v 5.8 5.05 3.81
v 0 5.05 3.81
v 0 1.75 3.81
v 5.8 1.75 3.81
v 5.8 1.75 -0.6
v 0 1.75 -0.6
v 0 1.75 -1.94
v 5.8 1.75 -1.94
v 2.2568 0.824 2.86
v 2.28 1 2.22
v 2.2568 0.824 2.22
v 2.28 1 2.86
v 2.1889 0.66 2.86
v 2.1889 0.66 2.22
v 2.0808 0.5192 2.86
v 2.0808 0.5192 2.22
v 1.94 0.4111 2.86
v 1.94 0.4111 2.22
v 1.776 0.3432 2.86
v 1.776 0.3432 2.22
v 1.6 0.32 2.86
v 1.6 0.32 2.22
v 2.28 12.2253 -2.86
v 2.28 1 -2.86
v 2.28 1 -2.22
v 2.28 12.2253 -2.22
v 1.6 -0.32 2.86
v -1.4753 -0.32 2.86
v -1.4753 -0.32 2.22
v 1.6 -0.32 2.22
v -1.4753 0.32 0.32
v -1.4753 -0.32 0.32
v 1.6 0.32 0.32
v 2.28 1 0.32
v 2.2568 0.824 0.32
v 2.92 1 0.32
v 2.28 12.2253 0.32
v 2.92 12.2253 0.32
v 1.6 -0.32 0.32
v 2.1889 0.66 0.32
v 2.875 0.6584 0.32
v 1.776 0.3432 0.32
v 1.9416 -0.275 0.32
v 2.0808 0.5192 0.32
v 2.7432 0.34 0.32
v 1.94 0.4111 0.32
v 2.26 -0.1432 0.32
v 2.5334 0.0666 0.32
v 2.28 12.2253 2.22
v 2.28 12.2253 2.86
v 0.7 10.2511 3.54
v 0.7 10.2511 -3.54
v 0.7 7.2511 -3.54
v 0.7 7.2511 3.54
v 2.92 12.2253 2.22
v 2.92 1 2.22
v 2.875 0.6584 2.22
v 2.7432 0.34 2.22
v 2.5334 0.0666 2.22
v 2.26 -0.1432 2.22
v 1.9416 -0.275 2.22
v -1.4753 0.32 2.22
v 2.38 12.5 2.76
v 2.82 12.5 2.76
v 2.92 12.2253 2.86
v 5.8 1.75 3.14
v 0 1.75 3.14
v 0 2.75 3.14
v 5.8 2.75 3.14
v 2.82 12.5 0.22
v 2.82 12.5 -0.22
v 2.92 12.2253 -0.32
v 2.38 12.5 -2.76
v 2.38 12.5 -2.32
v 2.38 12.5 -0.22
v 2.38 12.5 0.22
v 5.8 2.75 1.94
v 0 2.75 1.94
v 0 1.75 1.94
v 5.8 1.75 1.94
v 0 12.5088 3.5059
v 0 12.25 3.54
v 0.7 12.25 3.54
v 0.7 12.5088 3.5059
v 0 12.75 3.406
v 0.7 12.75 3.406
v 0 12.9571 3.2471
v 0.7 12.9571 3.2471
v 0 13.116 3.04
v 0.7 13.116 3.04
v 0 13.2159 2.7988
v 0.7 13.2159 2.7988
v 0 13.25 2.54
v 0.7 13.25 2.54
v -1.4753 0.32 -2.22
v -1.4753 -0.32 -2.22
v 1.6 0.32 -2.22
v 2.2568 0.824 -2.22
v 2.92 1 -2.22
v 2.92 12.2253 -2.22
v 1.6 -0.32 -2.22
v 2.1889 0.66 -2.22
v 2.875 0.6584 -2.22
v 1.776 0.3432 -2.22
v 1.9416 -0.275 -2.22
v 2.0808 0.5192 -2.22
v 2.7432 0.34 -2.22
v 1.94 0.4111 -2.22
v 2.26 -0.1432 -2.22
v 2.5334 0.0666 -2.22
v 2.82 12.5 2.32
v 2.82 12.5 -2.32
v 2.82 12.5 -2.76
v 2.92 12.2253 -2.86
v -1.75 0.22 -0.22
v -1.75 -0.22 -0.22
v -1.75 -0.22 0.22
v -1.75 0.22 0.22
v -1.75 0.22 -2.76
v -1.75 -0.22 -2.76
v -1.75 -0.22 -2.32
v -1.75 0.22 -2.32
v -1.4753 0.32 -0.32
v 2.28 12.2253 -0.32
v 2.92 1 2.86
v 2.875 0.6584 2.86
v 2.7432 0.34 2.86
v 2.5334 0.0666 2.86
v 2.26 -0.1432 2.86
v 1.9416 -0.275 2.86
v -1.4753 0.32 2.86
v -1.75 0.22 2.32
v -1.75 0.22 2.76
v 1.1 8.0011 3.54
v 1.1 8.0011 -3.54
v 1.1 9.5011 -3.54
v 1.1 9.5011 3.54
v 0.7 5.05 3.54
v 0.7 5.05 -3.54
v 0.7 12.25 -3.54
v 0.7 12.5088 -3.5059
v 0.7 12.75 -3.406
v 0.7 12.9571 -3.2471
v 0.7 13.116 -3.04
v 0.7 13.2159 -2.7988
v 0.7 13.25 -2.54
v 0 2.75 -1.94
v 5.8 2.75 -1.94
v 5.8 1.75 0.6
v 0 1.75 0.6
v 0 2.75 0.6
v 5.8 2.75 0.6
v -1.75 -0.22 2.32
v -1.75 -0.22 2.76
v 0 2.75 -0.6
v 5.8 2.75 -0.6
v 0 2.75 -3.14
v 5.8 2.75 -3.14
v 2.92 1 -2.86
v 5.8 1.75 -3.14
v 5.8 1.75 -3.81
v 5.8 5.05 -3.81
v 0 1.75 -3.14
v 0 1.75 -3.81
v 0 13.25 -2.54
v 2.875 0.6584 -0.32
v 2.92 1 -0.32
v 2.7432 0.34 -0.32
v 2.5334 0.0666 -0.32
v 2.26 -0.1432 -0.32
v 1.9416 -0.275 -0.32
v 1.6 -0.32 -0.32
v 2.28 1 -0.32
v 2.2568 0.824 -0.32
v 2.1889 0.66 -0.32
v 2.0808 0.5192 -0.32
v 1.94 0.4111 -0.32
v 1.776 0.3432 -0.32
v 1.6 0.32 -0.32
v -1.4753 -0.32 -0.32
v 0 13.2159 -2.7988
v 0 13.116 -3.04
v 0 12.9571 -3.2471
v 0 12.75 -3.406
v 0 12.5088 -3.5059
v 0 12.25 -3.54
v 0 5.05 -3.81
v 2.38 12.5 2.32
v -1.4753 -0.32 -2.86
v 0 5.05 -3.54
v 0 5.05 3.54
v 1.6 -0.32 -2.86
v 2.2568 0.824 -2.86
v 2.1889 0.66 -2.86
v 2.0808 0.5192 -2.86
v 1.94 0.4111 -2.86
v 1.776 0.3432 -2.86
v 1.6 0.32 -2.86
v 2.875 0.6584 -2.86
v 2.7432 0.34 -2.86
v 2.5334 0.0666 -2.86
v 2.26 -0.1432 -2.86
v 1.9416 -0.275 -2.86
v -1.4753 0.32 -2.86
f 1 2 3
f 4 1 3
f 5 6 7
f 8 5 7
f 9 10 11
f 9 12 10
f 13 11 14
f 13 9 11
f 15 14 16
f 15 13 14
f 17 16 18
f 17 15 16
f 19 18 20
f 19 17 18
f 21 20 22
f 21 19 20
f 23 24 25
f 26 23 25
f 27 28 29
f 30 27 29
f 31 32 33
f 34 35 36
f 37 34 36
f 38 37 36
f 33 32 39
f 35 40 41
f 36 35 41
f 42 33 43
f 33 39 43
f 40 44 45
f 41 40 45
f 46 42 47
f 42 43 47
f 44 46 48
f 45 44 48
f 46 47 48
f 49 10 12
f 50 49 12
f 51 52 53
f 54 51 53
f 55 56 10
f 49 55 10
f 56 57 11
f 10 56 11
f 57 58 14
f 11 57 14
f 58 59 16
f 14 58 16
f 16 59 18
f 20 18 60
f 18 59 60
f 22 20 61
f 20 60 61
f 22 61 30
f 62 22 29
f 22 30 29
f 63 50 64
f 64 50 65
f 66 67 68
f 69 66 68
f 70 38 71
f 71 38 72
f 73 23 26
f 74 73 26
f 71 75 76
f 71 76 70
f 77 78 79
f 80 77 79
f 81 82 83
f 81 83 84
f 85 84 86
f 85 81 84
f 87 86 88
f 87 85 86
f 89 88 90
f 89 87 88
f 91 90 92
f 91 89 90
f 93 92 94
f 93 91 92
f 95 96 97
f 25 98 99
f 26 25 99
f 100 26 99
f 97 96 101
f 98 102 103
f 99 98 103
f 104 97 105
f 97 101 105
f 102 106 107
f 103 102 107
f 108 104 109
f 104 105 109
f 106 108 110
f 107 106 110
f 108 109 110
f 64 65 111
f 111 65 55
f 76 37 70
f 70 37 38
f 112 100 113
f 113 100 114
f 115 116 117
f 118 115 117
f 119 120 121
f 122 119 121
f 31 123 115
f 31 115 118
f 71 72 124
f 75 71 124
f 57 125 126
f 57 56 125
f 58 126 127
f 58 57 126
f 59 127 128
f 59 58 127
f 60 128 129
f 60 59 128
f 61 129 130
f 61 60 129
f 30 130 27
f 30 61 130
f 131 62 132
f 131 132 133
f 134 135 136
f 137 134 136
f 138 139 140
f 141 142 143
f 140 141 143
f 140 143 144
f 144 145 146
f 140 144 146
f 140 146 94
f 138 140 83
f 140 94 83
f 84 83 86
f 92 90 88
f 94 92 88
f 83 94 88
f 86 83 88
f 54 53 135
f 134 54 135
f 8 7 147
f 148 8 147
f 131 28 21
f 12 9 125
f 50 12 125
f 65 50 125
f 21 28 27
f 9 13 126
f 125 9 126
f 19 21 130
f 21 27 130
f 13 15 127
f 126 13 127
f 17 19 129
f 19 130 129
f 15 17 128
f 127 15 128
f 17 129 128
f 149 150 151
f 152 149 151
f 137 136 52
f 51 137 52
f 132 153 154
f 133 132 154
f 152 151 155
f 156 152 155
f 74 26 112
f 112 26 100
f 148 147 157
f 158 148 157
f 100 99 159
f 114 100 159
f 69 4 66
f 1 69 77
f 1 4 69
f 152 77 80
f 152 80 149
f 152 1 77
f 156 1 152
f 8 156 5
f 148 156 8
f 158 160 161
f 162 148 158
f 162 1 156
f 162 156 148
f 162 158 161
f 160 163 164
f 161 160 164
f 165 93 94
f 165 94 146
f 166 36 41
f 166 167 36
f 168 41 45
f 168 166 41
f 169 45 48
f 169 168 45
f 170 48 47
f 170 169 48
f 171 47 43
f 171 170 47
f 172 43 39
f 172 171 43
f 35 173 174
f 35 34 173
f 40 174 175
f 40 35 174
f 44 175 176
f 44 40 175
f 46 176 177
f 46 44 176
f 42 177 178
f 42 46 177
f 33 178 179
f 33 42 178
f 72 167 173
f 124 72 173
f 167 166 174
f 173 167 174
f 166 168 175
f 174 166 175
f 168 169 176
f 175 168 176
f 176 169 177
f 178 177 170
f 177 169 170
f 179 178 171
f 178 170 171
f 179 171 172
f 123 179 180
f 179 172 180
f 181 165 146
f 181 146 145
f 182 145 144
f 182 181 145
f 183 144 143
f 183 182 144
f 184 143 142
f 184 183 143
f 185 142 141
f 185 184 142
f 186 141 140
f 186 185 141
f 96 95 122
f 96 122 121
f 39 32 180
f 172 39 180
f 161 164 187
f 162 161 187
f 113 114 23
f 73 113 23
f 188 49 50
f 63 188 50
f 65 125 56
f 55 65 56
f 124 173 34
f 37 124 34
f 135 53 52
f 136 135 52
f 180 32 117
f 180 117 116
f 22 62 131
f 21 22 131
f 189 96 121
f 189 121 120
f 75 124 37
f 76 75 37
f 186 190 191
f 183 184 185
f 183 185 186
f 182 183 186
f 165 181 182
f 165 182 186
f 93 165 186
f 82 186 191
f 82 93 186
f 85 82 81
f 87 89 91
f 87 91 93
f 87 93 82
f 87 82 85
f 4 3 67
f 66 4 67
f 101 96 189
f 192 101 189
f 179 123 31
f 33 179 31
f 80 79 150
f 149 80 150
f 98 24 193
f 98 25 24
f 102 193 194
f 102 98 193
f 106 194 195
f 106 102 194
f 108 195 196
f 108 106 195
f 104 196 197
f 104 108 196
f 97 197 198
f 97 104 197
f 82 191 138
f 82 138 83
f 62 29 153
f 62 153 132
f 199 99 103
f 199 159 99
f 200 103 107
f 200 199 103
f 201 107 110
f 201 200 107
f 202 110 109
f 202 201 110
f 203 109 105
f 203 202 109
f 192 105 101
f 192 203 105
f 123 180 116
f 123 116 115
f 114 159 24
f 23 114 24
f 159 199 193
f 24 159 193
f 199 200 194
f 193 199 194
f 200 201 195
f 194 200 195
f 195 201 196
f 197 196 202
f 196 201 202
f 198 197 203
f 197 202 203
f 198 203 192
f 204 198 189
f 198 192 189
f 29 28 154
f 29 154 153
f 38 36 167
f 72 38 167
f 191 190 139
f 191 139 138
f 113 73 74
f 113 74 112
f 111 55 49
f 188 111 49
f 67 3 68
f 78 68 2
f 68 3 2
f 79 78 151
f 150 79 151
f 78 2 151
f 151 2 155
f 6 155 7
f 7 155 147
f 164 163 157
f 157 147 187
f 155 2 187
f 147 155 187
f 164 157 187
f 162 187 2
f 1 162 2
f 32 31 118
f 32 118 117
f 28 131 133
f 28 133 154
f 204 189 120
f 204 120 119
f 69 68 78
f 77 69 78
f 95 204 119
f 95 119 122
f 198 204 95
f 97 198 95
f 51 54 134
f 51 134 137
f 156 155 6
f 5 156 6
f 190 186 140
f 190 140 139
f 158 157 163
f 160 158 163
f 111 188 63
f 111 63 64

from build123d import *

# Parameters (mm, degrees)
SKETCH_1_W             = 0.64
SKETCH_1_H             = 0.64
CHAMFER_1_SIZE         = 0.1
CHAMFER_1_SIZE2        = 0.274747742
CHAMFER_2_SIZE         = 0.1
CHAMFER_2_SIZE2        = 0.274747742
PATTERN_LINEAR_3_COUNT = 2
PATTERN_LINEAR_3_PITCH = 2.54
EXTRUDE_1_DEPTH        = 5.8
EXTRUDE_2_DEPTH        = 0.7
EXTRUDE_3_DEPTH        = 7.08


with BuildPart() as part:
    # По траектории1: sweep along a curve in space
    with BuildLine() as sweep_1_path:
        Line((0, 0, 0), (-1.75, 0, 0))
        Line((0, 0, 0), (1.6, 0, 0))
        ThreePointArc((1.6, 0, 0), (2.307106781, 0.292893219, 0), (2.6, 1, 0))
        Line((2.6, 1, 0), (2.6, 12.5, 0))
    # Эскиз1 → По траектории1 (sweep)
    with BuildSketch(Plane(origin=(0, 0, 0), x_dir=(0, 0, -1), z_dir=(1, 0, 0))):
        Rectangle(SKETCH_1_W, SKETCH_1_H)
    sweep(path=sweep_1_path.line)

    # Фаска1
    chamfer_1_edges = [part.edges().sort_by_distance(p)[0] for p in [
        (2.92, 12.5, 0),
        (2.6, 12.5, -0.32),
        (2.28, 12.5, 0),
        (2.6, 12.5, 0.32),
    ]]
    chamfer_1_side = [part.faces().sort_by_distance(p)[0] for p in [
        (2.6, 12.5, 0),
    ]]
    chamfer(chamfer_1_edges, length=CHAMFER_1_SIZE, length2=CHAMFER_1_SIZE2, reference=chamfer_1_side[0])

    # Фаска2
    chamfer_2_edges = [part.edges().sort_by_distance(p)[0] for p in [
        (-1.75, 0, 0.32),
        (-1.75, -0.32, 0),
        (-1.75, 0, -0.32),
        (-1.75, 0.32, 0),
    ]]
    chamfer_2_side = [part.faces().sort_by_distance(p)[0] for p in [
        (-1.75, 0, 0),
    ]]
    chamfer(chamfer_2_edges, length=CHAMFER_2_SIZE, length2=CHAMFER_2_SIZE2, reference=chamfer_2_side[0])


with BuildPart() as body_2:
    # Линейный массив2: read off the stored shape, not the designer's step
    # Линейный массив2: copy of part
    add(part.part.moved(Location((0, 0, -2.54))))


with BuildPart() as pattern_linear_3_1:
    # Линейный массив3: pattern copy
    add(part.part.moved(Location(Vector(0, 0, 1) * (1 * PATTERN_LINEAR_3_PITCH))))


with BuildPart() as body_4:
    # Эскиз2 → Бобышка-Вытянуть1 (new body)
    with BuildSketch(Plane(origin=(0, 0, 0), x_dir=(0, 0, -1), z_dir=(1, 0, 0))):
        Polygon((0.6, 2.75), (0.6, 1.75), (1.94, 1.75), (1.94, 2.75), (3.14, 2.75), (3.14, 1.75), (3.81, 1.75), (3.81, 5.05), (-3.81, 5.05), (-3.81, 1.75), (-3.14, 1.75), (-3.14, 2.75), (-1.94, 2.75), (-1.94, 1.75), (-0.6, 1.75), (-0.6, 2.75), align=None)
    extrude(amount=EXTRUDE_1_DEPTH)


with BuildPart() as body_5:
    # Эскиз3 → Бобышка-Вытянуть2 (new body)
    with BuildSketch(Plane.ZY):
        with BuildLine():
            Line((-3.54, 5.05), (3.54, 5.05))
            Line((3.54, 5.05), (3.54, 12.25))
            ThreePointArc((3.54, 12.25), (3.247106781, 12.957106781), (2.54, 13.25))
            Line((2.54, 13.25), (-2.54, 13.25))
            ThreePointArc((-2.54, 13.25), (-3.247106781, 12.957106781), (-3.54, 12.25))
            Line((-3.54, 12.25), (-3.54, 5.05))
        make_face()
    extrude(amount=-EXTRUDE_2_DEPTH)


with BuildPart() as body_6:
    # Эскиз4 → Бобышка-Вытянуть3 (new body)
    with BuildSketch(Plane(origin=(0, 0, -3.54), x_dir=(-1, 0, 0), z_dir=(0, 0, -1))):
        Polygon((-0.7, 7.251063618), (-1.1, 8.001063618), (-1.1, 9.501063618), (-0.7, 10.251063618), align=None)
    extrude(amount=-EXTRUDE_3_DEPTH)


solid = Compound([part.part, body_2.part, pattern_linear_3_1.part, body_4.part, body_5.part, body_6.part])
